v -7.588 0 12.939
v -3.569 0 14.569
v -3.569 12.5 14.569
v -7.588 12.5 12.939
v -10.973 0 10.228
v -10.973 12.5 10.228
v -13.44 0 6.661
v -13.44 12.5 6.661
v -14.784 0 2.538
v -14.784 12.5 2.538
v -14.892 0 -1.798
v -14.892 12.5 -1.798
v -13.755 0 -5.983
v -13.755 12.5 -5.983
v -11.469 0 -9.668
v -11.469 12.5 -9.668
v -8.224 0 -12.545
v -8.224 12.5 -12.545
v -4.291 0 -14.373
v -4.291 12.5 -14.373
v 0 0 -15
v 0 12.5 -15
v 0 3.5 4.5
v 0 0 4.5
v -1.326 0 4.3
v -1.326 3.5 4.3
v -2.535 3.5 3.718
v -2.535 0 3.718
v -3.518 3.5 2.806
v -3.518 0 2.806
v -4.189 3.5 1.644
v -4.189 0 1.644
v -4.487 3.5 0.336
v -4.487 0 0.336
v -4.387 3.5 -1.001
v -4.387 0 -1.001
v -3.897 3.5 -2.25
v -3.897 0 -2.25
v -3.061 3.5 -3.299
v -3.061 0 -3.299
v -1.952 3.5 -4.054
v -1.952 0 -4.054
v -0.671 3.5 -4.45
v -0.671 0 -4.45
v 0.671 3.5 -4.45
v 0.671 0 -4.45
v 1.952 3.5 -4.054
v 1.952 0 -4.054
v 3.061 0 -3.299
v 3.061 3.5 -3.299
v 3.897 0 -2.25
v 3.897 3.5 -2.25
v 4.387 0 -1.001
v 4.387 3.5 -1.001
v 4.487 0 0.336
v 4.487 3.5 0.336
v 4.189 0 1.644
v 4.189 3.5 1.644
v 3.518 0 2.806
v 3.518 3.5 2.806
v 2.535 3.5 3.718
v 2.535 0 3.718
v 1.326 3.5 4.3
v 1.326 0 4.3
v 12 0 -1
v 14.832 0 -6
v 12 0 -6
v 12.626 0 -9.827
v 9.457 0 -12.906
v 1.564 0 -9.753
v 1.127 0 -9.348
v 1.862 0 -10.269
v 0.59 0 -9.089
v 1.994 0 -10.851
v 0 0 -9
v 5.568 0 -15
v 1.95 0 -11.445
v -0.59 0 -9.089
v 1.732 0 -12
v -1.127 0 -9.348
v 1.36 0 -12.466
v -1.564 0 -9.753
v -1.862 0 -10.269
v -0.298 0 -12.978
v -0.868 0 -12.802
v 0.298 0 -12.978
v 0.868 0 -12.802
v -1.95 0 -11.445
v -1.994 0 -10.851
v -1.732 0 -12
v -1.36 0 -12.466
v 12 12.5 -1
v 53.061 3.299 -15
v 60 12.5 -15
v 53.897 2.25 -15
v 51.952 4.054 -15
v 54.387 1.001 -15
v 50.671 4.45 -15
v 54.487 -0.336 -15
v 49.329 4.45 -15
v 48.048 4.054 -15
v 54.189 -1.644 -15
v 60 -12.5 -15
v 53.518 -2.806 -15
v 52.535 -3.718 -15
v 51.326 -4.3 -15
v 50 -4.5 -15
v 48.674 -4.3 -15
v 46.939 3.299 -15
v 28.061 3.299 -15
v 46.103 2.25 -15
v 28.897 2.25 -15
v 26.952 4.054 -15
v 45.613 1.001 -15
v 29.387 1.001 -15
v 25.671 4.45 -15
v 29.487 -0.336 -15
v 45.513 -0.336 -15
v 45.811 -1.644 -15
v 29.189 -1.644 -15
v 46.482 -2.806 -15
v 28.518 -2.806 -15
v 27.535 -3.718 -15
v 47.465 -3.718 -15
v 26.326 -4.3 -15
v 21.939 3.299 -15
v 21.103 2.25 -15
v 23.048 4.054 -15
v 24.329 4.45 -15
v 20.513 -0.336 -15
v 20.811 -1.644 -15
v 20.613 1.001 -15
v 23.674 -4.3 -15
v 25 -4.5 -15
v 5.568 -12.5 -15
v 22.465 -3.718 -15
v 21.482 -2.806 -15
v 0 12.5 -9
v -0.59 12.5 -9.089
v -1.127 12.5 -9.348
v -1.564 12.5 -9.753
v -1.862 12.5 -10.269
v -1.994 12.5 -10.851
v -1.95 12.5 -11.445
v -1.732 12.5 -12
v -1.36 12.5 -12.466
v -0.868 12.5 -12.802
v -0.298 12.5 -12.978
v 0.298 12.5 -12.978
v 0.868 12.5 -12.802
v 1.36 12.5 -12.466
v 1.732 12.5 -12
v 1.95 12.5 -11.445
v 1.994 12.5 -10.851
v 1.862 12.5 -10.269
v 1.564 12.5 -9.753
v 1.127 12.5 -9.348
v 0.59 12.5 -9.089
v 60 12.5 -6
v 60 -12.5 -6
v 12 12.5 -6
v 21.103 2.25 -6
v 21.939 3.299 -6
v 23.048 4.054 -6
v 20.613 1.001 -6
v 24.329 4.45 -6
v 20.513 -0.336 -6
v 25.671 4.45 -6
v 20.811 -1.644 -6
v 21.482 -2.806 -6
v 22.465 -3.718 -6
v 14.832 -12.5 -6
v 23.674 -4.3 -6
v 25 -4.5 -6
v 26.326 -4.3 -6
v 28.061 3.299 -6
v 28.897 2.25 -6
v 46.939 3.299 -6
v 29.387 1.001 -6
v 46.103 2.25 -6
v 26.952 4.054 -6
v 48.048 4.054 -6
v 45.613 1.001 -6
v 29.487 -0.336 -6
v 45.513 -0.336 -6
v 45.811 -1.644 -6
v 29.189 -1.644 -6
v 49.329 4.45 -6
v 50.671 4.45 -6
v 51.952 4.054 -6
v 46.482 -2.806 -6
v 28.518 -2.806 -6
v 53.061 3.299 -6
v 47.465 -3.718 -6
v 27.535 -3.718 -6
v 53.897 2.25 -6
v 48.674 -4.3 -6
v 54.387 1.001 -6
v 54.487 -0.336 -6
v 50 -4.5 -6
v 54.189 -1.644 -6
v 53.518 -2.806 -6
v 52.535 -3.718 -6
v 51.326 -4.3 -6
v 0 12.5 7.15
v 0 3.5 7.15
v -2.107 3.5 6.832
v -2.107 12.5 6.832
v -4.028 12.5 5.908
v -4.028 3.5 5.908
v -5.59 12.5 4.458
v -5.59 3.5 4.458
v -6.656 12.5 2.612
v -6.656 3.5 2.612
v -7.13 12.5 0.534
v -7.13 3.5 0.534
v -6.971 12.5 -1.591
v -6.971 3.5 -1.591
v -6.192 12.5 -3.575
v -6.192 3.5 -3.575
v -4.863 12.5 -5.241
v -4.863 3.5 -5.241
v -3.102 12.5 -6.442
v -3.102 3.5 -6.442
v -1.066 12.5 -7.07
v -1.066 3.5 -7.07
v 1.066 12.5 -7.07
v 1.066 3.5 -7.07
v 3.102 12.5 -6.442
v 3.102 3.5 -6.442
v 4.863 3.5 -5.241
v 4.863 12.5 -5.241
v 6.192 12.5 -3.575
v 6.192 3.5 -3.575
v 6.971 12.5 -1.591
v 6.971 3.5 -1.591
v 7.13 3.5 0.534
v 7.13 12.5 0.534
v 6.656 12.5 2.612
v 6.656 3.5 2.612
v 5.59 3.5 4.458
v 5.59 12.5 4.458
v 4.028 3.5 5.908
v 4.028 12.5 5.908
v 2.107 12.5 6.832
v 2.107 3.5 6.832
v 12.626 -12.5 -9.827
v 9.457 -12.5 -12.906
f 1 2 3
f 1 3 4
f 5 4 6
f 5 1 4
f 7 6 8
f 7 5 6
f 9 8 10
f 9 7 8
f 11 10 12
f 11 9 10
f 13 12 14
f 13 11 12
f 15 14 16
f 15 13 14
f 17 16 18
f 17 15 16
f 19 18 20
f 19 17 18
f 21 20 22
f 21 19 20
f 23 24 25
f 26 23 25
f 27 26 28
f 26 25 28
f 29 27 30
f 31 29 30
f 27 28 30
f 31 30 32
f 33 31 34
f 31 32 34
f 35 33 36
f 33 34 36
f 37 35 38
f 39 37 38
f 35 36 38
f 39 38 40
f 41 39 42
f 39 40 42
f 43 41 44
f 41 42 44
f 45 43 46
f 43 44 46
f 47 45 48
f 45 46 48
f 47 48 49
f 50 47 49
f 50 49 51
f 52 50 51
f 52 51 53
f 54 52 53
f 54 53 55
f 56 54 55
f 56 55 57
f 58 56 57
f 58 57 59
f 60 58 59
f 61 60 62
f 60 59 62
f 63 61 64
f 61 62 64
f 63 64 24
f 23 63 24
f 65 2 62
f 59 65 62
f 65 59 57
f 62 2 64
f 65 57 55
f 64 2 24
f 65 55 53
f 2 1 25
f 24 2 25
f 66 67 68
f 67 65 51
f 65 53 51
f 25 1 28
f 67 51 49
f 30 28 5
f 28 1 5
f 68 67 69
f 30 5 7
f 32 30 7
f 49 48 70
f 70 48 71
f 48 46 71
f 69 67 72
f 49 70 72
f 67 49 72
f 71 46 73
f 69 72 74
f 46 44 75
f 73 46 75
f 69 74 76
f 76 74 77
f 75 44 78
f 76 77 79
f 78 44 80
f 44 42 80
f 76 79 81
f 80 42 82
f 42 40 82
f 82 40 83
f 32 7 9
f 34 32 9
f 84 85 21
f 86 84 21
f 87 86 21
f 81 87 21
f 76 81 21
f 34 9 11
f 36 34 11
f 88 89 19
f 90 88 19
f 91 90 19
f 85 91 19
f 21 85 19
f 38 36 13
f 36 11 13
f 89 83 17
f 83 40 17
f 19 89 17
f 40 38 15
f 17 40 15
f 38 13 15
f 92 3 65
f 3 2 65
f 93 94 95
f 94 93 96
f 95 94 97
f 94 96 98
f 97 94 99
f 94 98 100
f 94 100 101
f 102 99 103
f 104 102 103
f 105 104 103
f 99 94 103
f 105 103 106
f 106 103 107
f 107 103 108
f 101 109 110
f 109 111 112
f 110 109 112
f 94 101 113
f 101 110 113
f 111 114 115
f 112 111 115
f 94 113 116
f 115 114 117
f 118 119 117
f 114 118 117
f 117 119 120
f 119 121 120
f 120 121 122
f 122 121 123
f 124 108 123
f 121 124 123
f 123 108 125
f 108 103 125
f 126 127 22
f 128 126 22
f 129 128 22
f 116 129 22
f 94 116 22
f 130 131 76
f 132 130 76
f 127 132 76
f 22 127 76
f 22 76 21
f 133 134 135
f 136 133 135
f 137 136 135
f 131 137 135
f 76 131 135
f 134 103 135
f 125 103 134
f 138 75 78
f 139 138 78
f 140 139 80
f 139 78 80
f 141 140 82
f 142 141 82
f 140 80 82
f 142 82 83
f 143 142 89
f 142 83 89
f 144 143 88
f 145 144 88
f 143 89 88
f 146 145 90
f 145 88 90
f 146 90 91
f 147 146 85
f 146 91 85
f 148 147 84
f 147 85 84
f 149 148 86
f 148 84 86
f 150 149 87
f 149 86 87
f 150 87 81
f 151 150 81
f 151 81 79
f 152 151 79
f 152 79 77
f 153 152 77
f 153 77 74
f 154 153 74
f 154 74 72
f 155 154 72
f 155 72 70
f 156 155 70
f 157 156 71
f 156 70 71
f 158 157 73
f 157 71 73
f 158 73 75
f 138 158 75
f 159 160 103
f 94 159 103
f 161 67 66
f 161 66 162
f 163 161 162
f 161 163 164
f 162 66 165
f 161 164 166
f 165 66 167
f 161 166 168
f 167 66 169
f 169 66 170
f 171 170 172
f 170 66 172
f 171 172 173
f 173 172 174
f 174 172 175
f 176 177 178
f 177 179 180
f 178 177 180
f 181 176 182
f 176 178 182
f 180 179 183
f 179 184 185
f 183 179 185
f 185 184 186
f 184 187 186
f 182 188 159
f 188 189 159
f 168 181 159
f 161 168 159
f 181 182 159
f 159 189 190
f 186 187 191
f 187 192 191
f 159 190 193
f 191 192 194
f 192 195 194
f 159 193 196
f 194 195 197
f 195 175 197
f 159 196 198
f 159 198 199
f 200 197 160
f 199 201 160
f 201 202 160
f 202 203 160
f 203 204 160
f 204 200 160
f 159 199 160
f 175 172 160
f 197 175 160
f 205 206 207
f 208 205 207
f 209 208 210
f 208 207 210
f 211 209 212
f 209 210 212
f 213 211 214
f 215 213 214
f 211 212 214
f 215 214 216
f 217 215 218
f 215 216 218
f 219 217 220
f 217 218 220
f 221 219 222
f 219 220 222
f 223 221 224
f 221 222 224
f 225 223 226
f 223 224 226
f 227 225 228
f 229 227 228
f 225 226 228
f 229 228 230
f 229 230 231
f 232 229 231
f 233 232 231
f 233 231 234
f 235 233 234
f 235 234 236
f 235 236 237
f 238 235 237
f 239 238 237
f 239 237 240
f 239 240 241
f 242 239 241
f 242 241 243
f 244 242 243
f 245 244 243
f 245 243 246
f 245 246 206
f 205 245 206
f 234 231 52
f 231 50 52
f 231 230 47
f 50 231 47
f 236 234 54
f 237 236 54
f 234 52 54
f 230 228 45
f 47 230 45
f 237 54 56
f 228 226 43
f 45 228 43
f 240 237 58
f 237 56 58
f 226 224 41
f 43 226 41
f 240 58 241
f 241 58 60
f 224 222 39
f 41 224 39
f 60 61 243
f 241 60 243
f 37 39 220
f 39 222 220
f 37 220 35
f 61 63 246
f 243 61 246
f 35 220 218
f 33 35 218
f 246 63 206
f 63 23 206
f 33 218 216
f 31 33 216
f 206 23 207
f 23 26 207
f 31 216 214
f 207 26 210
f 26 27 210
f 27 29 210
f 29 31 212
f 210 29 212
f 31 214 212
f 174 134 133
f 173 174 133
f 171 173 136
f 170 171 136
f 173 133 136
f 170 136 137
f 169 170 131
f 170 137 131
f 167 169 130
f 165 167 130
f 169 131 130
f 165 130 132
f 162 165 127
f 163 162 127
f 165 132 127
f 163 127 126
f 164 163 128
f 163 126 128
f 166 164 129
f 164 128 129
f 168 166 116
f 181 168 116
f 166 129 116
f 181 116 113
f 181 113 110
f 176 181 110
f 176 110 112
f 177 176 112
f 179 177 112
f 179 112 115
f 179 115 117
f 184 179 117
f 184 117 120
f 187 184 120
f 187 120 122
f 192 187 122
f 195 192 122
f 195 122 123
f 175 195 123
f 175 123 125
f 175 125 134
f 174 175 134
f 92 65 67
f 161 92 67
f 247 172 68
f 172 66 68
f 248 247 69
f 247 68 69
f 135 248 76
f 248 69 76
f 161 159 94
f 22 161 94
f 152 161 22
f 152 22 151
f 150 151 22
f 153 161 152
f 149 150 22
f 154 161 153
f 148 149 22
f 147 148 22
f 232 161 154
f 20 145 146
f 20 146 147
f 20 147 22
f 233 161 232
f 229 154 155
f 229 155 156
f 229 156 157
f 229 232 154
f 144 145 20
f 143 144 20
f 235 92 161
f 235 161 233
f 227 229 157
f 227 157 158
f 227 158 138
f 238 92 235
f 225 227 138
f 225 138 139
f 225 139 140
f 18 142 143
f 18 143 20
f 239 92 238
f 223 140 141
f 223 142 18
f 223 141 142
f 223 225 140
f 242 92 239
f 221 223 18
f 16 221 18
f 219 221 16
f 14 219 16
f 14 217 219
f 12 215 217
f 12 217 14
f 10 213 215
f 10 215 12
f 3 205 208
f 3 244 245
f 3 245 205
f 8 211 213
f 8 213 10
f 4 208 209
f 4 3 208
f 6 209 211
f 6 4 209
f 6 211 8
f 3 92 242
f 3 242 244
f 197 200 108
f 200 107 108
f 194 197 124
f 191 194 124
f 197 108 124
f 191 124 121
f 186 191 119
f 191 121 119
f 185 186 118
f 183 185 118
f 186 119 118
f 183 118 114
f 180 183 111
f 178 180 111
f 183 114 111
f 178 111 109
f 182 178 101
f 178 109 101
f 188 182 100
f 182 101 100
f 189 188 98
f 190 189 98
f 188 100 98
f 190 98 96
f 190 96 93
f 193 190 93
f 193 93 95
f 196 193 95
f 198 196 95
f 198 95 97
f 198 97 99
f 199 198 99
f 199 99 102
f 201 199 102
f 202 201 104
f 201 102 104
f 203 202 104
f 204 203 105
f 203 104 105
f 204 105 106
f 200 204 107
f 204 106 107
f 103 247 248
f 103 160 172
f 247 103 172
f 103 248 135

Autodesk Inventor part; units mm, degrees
ref_plane "YZ Plane" through (0, 0, 0) normal (1, 0, 0) x (0, 1, 0)
ref_plane "XZ Plane" through (0, 0, 0) normal (0, 1, 0) x (-1, 0, 0)
ref_plane "XY Plane" through (0, 0, 0) normal (0, 0, 1) x (1, 0, 0)
sketch "Sketch2" plane through (0, 0, 0) normal (0, 1, 0) x (-1, 0, 0)
  line L0 (-60, -6) -> (-60, -15)
  line L1 (-60, -15) -> (0, -15)
  arc A0 (0, -15) -> (3.5692, 14.5692) centre (0, 0) ccw
  line L2 (3.5692, 14.5692) -> (-12, -1)
  line L3 (-12, -1) -> (-12, -6)
  line L4 (-12, -6) -> (-60, -6)
  dimension "d1" = 15
  dimension "d2" = 60
  dimension "d3" = 9
  dimension "d4" = 45
  dimension "d5" = 5
  dimension "d6" = 7.7782
extrude "Extrusion1" add sketch "Sketch2" along normal mid plane 25
sketch "Sketch3" plane through (0, -12.5, 0) normal (0, -1, 0) x (1, 0, 0)
  point P0 (0, 0)
  point P1 (0, 0)
hole "Hole1" at (0, -12.5, 0) direction (0, 1, 0) diameter 32 depth 12.5
sketch "Sketch4" plane through (0, 12.5, 0) normal (0, 1, 0) x (1, 0, 0)
  point P0 (0, 0)
  point P1 (0, 0)
hole "Hole2" at (0, 12.5, 0) direction (0, -1, 0) diameter 9 end through all counterbore diameter 14.3 counterbore depth 9
sketch "Sketch5" plane through (0, 12.5, 0) normal (0, 1, 0) x (1, 0, 0)
  line L0 (0, 0) -> (0, 11) construction
  dimension "d23" = 11
hole "Hole3" at (0, 12.5, -11) direction (0, -1, 0) diameter 4 end through all
sketch "Sketch6" plane through (12, 12.5, -6) normal (0, 0, 1) x (1, 0, 0)
  line L0 (-42, -12.5) -> (63, -12.5) construction
  line L1 (48, -25) -> (48, 0) construction
  point P0 (-12, -12.5)
  point P1 (38, -12.5)
  point P2 (13, -12.5)
  dimension "d31" = 25
  dimension "d32" = 10
hole "Hole4" at (50, 0, -6) at (25, 0, -6) direction (0, 0, -1) diameter 9 end through all
equation "\"d14\" = 0.5 * d7"
equation "\"d21\" = 0.5 * d7"
equation "\"d7\" = 25"
properties part number "2DU81" material "Aluminum 6061"
